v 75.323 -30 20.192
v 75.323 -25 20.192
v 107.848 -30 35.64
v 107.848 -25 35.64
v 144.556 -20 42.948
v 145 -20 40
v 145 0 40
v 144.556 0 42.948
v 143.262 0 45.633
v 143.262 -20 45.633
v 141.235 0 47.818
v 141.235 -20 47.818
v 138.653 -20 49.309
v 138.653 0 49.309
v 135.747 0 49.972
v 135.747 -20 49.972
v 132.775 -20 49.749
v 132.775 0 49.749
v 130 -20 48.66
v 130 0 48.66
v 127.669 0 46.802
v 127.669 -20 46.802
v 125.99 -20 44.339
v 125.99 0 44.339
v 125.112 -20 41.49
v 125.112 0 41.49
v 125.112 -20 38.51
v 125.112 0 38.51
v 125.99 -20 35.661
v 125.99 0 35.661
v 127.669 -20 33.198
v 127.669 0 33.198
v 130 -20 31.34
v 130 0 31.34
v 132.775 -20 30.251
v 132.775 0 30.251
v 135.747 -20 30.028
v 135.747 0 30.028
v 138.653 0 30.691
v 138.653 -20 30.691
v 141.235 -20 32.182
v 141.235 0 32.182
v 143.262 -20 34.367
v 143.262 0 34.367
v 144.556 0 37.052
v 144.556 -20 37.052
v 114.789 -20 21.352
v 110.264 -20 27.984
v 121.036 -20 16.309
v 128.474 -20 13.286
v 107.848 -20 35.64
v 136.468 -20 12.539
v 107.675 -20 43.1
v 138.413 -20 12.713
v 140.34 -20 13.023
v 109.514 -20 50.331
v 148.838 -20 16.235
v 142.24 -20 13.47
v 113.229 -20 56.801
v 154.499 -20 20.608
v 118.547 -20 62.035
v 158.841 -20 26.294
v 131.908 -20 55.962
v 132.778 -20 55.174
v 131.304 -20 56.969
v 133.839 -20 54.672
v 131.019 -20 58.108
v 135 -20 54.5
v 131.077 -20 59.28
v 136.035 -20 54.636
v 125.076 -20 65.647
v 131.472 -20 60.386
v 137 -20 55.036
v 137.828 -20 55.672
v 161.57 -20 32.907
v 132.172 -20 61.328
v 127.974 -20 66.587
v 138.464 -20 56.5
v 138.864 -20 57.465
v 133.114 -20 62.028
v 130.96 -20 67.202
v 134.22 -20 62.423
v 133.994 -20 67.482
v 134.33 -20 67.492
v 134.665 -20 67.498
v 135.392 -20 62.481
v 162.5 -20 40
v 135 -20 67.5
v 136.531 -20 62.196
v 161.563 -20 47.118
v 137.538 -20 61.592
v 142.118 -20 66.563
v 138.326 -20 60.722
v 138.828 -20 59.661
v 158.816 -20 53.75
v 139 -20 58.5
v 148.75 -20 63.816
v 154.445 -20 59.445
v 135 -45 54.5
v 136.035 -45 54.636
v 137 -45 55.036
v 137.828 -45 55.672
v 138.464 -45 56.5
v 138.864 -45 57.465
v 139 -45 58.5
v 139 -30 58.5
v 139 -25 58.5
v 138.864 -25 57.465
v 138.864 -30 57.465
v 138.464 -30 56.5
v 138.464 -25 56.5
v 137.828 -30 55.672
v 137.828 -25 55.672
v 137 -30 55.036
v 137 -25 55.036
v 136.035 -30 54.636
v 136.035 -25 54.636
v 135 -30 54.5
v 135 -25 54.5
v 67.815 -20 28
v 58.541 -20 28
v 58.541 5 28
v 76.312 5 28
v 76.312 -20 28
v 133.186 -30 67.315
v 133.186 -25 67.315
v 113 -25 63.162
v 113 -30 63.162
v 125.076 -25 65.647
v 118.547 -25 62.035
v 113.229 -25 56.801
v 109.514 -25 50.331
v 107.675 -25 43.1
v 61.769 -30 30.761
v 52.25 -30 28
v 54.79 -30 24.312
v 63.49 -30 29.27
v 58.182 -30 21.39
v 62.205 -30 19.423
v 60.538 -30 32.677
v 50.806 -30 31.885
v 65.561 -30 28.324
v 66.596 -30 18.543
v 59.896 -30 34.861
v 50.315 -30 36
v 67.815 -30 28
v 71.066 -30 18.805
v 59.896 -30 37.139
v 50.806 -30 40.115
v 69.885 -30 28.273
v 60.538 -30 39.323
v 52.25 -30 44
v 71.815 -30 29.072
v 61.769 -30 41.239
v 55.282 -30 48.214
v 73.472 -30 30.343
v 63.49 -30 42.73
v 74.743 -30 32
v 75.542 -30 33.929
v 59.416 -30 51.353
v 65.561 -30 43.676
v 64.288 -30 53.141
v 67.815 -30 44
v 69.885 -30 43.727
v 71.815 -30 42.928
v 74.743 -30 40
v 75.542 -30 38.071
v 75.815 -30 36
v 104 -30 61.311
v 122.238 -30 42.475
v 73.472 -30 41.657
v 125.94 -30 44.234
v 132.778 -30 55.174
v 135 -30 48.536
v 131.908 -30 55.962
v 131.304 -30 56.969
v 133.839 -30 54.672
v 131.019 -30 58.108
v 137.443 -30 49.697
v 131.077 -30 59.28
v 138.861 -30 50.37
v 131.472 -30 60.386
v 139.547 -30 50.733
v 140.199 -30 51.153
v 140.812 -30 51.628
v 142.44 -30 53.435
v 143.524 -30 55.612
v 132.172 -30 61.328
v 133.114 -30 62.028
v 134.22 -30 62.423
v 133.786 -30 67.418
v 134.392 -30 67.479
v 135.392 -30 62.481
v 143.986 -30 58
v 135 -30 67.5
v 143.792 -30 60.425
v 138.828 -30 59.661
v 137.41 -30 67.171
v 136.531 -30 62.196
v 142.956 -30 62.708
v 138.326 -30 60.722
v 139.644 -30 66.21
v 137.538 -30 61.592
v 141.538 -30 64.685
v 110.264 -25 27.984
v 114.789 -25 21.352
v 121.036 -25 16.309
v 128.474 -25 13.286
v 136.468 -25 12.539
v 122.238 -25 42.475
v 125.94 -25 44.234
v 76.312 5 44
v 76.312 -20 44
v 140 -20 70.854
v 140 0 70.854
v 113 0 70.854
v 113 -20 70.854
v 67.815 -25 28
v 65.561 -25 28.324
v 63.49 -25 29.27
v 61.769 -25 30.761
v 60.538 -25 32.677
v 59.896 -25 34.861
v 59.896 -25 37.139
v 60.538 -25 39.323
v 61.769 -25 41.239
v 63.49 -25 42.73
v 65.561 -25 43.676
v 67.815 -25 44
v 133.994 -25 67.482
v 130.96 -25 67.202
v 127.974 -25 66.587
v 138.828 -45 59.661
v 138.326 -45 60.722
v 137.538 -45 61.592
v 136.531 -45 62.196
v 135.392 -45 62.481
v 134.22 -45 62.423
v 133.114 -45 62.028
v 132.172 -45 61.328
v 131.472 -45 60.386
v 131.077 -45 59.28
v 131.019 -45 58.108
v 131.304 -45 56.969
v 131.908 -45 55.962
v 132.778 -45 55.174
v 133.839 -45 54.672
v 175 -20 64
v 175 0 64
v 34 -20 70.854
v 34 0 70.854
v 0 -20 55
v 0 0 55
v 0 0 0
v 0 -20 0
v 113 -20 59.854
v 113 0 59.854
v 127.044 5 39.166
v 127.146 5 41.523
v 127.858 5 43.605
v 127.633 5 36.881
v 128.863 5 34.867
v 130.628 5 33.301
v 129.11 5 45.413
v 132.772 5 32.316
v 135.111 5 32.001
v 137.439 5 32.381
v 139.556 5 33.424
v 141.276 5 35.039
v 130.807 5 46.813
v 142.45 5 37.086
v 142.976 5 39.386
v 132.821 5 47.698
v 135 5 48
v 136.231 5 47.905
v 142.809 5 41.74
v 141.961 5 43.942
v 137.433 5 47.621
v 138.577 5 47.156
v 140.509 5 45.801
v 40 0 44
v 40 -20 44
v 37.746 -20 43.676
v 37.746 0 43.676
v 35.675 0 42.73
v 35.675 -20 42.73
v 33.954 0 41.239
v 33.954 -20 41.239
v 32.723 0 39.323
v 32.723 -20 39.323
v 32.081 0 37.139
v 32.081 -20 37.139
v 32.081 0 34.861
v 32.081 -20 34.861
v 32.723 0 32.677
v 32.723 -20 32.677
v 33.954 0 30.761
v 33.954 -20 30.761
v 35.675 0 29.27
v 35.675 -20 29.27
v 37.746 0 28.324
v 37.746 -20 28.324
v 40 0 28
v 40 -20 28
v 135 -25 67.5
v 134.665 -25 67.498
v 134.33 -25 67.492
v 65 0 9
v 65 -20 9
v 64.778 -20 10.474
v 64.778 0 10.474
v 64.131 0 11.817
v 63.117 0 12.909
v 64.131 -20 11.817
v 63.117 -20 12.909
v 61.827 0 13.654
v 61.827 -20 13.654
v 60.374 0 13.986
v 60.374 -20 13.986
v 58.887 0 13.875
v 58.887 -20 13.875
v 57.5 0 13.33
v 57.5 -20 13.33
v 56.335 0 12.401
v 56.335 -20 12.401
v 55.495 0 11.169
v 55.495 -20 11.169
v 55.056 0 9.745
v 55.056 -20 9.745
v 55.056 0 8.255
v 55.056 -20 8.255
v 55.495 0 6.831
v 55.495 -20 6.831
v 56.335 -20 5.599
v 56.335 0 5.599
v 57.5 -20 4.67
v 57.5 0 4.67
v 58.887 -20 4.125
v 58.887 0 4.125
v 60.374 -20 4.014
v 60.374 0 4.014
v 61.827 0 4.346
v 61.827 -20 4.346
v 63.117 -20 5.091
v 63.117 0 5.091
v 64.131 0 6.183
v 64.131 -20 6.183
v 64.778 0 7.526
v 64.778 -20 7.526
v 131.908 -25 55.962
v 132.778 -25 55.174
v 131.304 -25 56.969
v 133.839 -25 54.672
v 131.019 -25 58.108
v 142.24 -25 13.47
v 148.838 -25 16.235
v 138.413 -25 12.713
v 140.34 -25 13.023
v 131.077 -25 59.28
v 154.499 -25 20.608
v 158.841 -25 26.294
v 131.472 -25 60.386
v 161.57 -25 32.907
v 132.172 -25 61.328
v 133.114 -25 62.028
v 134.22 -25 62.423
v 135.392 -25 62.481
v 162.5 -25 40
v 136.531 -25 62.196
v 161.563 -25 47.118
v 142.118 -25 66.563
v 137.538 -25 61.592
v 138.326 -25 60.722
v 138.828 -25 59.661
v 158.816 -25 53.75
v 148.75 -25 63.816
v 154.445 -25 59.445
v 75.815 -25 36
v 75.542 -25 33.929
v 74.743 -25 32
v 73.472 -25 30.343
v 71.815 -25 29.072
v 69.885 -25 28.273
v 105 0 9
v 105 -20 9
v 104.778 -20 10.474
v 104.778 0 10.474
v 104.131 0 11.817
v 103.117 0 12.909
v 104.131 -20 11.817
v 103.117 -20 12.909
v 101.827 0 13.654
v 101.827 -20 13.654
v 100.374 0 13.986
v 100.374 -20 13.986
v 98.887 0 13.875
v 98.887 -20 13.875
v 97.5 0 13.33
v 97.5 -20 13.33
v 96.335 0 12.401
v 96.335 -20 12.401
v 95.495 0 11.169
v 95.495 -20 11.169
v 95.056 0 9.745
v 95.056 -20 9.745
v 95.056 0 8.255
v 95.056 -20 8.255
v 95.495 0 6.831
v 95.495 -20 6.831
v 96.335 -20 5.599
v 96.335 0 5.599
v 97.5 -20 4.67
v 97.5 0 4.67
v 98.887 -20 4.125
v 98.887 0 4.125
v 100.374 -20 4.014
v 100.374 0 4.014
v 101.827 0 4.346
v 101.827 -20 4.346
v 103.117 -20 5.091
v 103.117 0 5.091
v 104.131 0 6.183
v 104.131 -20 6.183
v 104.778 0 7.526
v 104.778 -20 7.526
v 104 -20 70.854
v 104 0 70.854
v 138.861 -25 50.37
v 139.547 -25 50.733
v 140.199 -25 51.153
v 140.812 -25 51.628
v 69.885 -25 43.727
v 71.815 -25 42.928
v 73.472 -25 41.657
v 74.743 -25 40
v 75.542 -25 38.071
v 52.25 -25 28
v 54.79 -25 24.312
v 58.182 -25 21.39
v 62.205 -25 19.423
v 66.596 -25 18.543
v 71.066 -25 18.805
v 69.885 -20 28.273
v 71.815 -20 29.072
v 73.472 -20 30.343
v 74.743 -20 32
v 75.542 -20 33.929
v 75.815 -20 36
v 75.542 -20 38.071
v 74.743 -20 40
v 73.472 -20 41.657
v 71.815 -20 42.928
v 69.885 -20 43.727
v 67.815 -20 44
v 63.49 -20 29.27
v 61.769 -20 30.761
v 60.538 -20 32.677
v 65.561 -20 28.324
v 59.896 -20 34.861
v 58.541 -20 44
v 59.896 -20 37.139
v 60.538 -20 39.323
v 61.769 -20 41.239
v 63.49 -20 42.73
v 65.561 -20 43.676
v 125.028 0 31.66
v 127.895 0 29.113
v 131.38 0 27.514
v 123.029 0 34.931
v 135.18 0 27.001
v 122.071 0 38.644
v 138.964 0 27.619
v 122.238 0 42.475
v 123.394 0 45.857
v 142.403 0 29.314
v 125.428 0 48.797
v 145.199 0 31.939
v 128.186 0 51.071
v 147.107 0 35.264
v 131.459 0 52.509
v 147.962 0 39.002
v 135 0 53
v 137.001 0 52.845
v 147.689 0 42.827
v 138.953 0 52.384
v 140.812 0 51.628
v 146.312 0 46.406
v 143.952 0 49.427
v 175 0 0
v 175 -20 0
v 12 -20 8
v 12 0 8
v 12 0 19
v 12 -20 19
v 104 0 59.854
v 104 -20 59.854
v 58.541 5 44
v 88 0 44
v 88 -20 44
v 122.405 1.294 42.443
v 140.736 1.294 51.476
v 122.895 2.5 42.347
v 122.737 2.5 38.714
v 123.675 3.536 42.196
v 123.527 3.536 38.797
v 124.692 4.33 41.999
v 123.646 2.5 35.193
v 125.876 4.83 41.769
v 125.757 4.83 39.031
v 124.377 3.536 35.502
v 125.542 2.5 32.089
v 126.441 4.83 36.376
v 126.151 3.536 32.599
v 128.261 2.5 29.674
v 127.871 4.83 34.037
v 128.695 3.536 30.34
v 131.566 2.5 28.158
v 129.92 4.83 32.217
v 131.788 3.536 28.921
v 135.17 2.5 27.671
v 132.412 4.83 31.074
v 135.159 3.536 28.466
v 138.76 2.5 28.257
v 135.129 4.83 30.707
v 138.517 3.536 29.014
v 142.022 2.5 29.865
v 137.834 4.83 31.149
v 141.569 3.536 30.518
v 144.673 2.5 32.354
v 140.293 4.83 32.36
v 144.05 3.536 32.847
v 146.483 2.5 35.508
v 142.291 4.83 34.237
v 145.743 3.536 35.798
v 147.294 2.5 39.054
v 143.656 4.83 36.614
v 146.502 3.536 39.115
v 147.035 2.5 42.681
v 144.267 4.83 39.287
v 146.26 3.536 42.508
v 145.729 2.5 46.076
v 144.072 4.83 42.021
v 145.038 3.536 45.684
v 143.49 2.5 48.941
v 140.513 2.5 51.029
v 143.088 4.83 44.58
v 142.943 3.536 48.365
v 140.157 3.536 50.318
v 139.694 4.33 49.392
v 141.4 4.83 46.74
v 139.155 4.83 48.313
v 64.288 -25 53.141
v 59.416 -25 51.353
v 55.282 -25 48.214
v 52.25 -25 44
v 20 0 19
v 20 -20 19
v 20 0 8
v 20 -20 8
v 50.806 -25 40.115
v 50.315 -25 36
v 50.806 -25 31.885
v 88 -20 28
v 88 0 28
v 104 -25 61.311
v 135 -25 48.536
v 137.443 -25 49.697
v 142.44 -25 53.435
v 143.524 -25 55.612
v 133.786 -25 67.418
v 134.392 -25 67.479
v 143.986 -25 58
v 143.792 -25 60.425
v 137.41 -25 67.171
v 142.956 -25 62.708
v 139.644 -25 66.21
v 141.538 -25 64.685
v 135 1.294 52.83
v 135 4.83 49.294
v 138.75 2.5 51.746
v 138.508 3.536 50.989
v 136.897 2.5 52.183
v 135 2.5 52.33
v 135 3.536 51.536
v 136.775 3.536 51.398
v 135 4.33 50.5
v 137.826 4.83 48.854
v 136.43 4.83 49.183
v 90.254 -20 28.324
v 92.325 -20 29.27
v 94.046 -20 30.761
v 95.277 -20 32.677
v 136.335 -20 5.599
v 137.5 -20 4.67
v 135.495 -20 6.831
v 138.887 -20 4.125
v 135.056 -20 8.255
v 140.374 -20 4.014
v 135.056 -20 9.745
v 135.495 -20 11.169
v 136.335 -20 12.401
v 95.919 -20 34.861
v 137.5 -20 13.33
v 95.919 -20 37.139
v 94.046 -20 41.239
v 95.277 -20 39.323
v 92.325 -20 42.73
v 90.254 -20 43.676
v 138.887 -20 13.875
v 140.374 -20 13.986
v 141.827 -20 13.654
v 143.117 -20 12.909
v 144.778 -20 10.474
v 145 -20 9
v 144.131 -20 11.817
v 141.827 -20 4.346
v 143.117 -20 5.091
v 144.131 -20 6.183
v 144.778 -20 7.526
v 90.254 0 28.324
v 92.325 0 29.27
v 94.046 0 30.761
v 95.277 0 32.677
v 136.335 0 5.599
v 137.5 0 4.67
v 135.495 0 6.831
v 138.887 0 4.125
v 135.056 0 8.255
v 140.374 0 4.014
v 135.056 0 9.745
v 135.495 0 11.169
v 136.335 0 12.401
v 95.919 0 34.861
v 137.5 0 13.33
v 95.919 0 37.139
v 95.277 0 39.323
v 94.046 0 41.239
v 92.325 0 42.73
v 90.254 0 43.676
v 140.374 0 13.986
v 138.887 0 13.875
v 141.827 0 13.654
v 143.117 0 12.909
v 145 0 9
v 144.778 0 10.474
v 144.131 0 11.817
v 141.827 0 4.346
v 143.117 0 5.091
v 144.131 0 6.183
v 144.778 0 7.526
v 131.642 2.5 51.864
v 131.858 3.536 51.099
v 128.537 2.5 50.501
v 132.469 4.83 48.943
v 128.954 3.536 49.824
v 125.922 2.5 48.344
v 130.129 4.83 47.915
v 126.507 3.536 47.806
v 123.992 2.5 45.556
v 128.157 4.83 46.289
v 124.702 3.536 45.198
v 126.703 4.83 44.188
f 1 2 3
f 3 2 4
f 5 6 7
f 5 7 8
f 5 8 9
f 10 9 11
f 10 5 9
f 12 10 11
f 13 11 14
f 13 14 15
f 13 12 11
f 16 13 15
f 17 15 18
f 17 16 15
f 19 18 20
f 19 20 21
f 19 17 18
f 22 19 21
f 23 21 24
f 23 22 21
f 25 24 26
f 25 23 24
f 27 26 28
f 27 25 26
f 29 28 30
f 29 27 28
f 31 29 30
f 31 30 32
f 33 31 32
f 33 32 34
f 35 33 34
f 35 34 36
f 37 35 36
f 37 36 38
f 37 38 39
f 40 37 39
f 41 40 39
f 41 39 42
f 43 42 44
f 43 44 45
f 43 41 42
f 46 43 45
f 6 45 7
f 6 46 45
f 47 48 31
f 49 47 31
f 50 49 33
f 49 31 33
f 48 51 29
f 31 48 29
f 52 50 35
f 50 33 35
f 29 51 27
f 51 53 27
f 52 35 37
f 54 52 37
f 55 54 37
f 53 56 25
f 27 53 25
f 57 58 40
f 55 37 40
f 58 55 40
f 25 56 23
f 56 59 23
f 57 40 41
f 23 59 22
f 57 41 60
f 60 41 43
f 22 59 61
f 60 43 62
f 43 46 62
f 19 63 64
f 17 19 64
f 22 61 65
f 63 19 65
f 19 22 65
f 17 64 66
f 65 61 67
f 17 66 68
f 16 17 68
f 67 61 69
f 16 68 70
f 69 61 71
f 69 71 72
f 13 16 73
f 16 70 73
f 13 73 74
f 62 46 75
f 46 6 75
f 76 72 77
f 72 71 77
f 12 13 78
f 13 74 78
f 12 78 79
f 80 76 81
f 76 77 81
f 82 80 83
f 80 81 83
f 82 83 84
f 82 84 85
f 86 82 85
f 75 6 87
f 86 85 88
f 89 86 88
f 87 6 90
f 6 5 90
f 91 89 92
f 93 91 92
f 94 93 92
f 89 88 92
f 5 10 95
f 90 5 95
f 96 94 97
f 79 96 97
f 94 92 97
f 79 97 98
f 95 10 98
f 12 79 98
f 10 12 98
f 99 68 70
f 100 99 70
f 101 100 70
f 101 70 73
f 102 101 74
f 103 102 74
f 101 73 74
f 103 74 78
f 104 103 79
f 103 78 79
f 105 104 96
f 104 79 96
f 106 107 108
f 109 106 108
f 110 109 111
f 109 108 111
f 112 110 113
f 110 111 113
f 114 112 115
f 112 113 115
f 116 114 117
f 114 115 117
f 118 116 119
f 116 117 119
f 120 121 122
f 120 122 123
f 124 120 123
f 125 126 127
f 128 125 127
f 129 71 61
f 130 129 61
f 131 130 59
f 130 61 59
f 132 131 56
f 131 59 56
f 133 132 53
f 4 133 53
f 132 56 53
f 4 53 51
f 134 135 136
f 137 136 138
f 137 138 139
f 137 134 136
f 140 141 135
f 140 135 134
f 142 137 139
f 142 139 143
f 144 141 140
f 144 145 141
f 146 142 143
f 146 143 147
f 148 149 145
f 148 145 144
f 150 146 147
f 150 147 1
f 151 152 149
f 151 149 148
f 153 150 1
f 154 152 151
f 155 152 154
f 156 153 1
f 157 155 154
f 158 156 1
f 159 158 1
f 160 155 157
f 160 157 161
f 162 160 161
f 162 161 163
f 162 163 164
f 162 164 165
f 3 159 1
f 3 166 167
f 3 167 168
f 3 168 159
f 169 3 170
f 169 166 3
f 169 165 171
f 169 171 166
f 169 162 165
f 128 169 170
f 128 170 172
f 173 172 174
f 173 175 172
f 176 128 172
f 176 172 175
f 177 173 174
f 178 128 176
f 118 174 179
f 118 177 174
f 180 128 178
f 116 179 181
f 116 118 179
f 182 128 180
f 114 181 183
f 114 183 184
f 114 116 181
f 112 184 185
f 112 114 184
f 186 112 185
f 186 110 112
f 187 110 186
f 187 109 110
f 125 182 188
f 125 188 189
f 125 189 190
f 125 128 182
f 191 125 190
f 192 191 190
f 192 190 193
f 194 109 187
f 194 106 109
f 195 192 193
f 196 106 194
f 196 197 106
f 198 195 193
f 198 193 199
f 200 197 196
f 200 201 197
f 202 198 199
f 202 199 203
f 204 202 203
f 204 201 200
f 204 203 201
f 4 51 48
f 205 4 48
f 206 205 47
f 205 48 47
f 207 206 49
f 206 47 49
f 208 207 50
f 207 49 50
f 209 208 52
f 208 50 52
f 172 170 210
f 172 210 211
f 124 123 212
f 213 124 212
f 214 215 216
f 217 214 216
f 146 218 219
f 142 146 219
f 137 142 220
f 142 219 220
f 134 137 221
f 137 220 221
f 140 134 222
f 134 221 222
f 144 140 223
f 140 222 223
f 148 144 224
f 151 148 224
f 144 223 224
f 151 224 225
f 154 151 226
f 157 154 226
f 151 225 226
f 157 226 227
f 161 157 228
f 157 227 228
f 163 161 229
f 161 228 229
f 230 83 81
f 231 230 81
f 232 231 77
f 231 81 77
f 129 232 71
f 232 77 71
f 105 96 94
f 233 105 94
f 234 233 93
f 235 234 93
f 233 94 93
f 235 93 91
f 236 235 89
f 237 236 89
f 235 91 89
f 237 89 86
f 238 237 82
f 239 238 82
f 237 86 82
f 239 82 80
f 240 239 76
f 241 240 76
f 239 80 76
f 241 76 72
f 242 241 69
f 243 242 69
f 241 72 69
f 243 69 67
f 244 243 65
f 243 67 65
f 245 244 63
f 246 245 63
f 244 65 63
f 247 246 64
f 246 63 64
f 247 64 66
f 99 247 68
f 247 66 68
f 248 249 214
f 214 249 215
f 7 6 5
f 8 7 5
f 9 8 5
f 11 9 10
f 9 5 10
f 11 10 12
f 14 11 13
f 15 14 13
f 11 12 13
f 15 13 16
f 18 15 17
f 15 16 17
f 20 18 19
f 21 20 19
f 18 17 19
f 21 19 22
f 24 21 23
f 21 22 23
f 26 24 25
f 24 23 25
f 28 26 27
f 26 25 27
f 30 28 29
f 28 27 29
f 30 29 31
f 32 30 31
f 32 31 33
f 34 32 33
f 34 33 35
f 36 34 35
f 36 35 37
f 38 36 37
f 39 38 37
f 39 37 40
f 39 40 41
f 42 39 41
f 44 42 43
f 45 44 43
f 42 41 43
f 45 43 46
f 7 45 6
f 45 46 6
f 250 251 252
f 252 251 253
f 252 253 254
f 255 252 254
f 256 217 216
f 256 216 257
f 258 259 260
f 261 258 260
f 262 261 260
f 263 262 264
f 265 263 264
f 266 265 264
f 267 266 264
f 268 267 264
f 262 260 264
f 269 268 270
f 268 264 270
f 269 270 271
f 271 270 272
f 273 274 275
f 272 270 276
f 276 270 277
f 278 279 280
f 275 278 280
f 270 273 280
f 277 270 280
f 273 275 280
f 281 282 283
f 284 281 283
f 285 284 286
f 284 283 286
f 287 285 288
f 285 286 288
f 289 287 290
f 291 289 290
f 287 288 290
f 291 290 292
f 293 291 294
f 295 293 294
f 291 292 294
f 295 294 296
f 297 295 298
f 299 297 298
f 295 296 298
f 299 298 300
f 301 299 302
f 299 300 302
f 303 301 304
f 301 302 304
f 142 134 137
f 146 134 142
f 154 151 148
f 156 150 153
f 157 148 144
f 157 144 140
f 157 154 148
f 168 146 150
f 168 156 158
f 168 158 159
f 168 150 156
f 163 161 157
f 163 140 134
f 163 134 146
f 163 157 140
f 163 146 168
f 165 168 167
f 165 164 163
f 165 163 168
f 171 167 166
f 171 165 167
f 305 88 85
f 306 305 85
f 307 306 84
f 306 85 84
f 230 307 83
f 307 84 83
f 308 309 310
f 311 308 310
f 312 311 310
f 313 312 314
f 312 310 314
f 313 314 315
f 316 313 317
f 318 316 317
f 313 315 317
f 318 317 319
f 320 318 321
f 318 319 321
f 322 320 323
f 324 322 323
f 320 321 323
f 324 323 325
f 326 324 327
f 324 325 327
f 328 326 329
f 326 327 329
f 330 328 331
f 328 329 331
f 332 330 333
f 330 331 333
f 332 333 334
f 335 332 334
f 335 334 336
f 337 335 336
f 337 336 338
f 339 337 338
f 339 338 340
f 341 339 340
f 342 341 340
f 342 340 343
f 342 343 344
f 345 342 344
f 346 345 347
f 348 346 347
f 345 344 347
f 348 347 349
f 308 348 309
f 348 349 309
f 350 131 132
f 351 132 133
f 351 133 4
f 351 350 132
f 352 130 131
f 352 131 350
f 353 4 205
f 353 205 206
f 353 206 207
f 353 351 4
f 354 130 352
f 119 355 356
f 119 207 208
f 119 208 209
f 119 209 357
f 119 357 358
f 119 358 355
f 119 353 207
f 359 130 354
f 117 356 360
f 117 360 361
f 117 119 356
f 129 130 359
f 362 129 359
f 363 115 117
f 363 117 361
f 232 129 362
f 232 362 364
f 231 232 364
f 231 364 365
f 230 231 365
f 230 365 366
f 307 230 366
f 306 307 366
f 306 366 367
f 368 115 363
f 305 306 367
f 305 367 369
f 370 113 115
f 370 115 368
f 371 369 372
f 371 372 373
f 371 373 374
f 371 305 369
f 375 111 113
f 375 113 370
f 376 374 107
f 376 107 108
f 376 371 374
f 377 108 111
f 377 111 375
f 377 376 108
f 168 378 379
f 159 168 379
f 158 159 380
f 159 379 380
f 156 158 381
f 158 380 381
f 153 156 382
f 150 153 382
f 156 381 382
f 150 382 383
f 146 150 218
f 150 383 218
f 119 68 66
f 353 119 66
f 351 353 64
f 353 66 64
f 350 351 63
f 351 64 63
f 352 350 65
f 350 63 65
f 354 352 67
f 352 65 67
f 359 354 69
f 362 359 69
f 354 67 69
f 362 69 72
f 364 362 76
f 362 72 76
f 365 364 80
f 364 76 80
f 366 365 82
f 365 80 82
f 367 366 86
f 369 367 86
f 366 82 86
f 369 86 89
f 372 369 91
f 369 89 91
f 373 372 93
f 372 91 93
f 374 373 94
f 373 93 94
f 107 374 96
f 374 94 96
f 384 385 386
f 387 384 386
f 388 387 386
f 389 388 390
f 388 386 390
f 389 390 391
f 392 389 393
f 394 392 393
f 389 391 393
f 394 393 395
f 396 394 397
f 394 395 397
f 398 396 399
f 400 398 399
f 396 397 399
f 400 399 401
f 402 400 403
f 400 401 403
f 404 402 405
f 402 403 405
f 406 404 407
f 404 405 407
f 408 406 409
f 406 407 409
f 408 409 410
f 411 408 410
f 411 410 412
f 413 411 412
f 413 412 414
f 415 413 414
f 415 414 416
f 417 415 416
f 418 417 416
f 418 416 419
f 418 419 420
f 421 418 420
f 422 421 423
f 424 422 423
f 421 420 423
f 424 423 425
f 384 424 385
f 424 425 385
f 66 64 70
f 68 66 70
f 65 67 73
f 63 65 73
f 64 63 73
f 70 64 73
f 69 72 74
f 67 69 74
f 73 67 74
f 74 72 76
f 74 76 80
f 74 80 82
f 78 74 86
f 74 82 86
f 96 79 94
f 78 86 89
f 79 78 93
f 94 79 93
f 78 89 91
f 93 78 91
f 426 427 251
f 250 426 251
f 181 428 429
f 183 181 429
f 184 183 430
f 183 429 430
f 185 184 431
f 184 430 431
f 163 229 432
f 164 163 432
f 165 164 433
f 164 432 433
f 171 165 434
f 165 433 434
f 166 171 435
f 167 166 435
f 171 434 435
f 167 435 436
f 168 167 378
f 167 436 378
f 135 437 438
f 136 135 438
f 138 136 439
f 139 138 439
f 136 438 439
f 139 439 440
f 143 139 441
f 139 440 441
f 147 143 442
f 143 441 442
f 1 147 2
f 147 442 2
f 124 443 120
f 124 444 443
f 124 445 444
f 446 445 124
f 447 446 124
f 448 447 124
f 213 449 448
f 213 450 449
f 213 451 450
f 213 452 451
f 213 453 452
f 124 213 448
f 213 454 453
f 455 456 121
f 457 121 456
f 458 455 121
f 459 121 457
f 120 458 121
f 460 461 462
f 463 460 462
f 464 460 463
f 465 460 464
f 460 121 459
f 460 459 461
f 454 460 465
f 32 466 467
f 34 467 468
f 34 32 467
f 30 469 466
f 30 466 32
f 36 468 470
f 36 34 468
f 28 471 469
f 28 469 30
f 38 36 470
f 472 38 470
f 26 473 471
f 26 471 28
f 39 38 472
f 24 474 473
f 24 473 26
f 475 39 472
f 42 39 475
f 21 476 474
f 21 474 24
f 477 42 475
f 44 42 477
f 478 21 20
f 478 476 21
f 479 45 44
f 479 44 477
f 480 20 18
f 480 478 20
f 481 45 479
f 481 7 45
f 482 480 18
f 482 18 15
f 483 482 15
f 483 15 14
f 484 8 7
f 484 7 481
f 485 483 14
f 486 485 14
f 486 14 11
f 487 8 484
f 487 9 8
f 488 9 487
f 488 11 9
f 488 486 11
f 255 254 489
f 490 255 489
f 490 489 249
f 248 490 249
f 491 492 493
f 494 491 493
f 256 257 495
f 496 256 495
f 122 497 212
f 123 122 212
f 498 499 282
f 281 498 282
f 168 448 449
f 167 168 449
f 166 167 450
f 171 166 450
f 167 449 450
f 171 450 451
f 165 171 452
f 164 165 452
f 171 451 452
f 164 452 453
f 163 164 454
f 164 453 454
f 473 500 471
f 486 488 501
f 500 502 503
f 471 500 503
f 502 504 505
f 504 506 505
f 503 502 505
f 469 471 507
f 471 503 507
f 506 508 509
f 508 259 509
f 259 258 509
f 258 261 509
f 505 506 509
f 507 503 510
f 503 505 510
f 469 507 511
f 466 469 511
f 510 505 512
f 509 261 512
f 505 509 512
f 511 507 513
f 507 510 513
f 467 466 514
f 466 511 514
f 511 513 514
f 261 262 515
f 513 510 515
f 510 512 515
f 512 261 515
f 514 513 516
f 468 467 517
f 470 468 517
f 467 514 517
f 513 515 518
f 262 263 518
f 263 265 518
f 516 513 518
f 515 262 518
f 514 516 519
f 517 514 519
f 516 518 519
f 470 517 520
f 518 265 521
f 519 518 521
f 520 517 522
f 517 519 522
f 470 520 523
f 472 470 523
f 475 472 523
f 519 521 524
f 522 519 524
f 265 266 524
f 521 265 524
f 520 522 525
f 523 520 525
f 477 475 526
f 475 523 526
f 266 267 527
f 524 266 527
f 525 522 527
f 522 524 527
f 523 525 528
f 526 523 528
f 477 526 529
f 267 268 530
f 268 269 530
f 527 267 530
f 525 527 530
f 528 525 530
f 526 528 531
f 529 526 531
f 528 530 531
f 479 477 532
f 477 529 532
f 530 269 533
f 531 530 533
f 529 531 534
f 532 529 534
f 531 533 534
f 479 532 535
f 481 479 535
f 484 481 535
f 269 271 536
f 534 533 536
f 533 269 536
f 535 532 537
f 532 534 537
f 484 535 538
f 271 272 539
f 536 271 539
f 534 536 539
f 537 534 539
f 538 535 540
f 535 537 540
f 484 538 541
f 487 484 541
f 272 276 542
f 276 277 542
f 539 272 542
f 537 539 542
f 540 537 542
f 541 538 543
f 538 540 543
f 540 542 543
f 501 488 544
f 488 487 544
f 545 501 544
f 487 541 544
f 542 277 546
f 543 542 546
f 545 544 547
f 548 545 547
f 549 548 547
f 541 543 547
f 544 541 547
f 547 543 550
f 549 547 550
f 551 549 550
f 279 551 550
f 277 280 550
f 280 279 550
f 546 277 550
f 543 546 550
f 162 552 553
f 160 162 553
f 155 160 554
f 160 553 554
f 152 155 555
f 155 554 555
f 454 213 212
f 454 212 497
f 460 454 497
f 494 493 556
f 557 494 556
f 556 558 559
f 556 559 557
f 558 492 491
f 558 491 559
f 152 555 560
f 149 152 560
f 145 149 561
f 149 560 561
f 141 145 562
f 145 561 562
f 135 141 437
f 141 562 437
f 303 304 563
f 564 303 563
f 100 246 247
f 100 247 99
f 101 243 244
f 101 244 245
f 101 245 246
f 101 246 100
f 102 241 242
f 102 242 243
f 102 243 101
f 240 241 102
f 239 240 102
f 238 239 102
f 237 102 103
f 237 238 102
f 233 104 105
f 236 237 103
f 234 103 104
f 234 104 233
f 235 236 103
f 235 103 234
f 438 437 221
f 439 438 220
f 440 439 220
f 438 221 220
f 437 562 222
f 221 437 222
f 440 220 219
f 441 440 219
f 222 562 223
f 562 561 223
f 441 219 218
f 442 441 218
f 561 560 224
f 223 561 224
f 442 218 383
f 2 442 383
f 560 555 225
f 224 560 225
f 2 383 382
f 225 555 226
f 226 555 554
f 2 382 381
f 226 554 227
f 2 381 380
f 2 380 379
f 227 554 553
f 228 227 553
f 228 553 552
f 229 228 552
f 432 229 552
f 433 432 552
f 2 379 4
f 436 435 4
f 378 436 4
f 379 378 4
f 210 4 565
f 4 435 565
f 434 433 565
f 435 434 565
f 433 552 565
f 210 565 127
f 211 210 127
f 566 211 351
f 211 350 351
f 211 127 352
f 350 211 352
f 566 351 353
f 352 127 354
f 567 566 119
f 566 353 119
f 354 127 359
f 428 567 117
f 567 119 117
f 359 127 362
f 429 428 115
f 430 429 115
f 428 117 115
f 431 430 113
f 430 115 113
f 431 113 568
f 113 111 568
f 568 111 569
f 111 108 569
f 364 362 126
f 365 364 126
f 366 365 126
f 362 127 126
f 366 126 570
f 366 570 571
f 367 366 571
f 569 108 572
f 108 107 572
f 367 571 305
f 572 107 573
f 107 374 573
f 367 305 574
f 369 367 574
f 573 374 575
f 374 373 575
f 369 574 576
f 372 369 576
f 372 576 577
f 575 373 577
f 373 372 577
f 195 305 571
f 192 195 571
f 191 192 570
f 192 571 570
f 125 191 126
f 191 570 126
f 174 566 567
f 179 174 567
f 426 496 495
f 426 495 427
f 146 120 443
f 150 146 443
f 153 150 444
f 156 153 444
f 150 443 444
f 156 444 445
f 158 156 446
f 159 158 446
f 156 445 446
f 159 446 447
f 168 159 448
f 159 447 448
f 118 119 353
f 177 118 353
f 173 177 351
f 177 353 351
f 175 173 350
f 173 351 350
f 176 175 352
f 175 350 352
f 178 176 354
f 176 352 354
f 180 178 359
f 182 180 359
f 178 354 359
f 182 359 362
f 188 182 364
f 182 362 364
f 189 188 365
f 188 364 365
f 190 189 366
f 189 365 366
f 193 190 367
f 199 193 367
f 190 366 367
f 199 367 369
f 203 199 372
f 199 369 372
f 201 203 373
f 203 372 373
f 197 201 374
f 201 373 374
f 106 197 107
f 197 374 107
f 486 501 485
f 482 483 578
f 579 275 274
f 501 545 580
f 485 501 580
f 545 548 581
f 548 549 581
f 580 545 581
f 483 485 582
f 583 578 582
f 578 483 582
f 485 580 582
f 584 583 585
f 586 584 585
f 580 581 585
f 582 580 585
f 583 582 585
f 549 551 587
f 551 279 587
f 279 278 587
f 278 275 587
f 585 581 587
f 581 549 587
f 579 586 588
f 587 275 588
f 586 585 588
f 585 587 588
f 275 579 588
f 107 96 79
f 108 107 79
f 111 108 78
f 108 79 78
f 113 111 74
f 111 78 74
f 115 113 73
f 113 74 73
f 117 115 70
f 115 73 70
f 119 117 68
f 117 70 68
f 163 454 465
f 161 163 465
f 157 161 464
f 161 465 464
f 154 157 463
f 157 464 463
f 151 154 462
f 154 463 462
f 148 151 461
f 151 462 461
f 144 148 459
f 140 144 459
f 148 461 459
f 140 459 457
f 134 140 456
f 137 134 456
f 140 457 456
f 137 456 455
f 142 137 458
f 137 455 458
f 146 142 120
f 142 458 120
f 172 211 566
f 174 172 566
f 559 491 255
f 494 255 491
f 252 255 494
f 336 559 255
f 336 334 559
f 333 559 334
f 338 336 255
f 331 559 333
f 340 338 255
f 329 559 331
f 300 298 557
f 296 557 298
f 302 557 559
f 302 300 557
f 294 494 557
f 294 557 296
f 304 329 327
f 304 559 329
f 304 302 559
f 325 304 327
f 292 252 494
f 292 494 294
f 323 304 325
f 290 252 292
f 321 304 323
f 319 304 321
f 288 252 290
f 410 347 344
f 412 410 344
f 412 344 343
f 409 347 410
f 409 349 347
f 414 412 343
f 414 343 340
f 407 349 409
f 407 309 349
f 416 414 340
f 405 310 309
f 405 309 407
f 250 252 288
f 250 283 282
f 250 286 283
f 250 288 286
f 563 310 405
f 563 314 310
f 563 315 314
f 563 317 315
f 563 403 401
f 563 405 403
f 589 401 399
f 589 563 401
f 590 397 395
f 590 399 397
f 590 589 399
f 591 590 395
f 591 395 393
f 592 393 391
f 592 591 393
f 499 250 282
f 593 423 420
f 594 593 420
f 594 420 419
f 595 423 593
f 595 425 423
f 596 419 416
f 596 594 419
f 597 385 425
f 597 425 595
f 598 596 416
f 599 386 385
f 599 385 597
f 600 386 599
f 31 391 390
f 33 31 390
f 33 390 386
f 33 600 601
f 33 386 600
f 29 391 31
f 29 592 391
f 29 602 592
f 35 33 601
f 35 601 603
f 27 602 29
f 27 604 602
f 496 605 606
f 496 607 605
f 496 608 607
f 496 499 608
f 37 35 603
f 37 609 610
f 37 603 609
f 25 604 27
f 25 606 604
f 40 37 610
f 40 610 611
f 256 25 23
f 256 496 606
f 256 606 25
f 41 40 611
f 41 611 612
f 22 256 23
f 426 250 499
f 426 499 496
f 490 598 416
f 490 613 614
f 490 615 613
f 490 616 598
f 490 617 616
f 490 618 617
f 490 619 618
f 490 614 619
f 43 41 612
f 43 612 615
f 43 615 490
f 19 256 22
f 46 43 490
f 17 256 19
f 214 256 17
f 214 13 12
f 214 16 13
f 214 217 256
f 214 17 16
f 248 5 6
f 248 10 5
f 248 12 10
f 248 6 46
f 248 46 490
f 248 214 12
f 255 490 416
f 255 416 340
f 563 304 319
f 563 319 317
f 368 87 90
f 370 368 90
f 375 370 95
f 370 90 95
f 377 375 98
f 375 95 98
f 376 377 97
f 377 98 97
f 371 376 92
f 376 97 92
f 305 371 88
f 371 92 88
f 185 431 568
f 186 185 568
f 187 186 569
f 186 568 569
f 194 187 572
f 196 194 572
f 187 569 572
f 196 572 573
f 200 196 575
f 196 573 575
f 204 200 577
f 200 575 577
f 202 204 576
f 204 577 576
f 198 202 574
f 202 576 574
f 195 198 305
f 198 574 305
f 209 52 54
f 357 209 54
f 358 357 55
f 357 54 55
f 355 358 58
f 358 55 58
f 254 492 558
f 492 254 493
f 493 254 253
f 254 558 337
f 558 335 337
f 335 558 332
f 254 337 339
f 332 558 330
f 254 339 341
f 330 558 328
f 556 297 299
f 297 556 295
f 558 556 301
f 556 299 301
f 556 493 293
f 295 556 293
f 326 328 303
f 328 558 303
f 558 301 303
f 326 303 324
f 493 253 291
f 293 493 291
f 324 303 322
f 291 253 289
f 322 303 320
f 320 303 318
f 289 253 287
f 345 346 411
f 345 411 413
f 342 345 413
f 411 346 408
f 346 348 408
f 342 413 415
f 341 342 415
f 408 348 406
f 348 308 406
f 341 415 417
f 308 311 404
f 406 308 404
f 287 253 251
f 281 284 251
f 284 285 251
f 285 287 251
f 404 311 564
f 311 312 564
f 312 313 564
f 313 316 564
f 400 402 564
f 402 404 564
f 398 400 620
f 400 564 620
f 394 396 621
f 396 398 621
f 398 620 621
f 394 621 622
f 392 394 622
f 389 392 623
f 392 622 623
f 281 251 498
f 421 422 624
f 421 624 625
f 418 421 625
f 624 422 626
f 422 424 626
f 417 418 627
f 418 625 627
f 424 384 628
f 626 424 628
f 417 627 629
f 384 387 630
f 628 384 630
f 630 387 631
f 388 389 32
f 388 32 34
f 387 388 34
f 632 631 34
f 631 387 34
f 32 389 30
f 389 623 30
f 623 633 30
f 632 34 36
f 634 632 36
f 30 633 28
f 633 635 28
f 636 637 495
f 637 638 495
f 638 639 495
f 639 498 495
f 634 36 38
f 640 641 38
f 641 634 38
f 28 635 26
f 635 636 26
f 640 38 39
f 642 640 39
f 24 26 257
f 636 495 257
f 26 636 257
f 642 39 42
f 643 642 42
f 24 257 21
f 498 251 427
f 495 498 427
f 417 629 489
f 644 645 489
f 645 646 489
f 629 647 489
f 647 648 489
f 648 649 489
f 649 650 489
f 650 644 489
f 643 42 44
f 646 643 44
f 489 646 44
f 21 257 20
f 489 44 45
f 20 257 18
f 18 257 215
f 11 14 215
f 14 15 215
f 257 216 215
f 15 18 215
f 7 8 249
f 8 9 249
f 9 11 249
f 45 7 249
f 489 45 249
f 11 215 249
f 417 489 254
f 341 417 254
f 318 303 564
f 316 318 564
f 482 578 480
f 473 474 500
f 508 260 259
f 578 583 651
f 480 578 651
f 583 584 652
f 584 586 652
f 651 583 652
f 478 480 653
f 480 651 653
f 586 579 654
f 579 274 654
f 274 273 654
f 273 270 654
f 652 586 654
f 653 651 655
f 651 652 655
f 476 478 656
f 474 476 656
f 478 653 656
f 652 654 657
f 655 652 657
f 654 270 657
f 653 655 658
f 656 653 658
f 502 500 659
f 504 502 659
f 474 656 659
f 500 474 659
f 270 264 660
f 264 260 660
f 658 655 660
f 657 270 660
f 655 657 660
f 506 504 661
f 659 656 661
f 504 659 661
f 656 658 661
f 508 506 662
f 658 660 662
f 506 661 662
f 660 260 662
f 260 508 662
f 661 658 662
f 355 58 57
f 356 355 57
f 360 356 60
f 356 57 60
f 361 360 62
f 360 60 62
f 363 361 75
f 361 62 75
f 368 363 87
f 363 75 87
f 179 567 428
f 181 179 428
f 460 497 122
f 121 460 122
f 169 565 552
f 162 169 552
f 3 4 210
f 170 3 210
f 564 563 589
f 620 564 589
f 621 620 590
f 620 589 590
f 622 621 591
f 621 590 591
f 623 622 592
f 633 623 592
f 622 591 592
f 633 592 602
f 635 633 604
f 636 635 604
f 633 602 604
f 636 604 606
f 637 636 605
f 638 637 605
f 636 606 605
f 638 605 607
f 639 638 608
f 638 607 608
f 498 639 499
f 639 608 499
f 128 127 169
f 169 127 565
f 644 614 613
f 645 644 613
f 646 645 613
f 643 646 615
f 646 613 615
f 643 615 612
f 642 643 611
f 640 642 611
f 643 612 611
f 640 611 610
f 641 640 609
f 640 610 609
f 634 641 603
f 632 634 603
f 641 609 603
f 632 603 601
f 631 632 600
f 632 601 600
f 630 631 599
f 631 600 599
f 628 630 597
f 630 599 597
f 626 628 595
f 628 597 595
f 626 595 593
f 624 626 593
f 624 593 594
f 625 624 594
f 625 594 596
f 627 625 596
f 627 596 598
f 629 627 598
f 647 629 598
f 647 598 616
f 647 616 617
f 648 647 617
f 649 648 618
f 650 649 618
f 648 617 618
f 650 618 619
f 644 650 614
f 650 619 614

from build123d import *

# Parameters (mm, degrees)
F1_DEPTH       = 20
F2_W           = 8
F2_H           = 11
F2_R           = 5
F2_R_2         = 10
F3_DEPTH       = 20
F5_DEPTH       = 5
F5_DEPTH_BACK  = 25
F7_R           = 4.99999
F8_DEPTH       = 5
F9_DEPTH       = 25
F10_START      = 5
F10_DEPTH      = 5
F11_DEPTH      = 25
F11_DEPTH_BACK = 10
F12_DEPTH      = 25


# Not quite as in the source:
# - a fillet or chamfer is up to 0.001 mm smaller than in the source, because OpenCascade refuses the exact size


with BuildPart() as f1:
    # F0 (on Front) → F1 (new body)
    with BuildSketch(Plane.XZ):
        Polygon((0, 55), (0, 0), (175, 0), (175, 64), (140, 70.8544603773), (113, 70.8544603773), (113, 59.8544603773), (104, 59.8544603773), (104, 70.8544603773), (34, 70.8544603773), align=None)
    extrude(amount=F1_DEPTH)

    # F2 (on face) → F3 (cut, through all)
    with BuildSketch(Plane.XZ.offset(20)):
        with Locations((16, 13.5)):
            Rectangle(F2_W, F2_H)
        with Locations((60, 9)):
            Circle(F2_R)
        with BuildLine():
            Line((88, 44), (40, 44))
            ThreePointArc((40, 44), (32, 36), (40, 28))
            Line((40, 28), (88, 28))
            ThreePointArc((88, 28), (96, 36), (88, 44))
        make_face()
        with Locations((135, 40)):
            Circle(F2_R_2)
        with Locations((100, 9)):
            Circle(F2_R)
        with Locations((140, 9)):
            Circle(F2_R)
    extrude(amount=-F3_DEPTH, mode=Mode.SUBTRACT)


with BuildPart() as f5:
    # F4 (on face) → F5 (new body, two sides)
    with BuildSketch(Plane.XZ.offset(20)) as f5_sk:
        with BuildLine():
            ThreePointArc((148, 40), (146.0579755506, 46.8352890738), (140.8121266581, 51.6283783784))
            ThreePointArc((140.8121266581, 51.6283783784), (139.8774040705, 50.9362093146), (138.8612225529, 50.3703652975))
            Line((138.8612225529, 50.3703652975), (137.4433104674, 49.6969187869))
            ThreePointArc((137.4433104674, 49.6969187869), (142.8877469747, 46.1468241933), (145, 40))
            ThreePointArc((145, 40), (132.8316568043, 30.2379158073), (125.9403424429, 44.2335097671))
            Line((125.9403424429, 44.2335097671), (122.2377651401, 42.4749467432))
            ThreePointArc((122.2377651401, 42.4749467432), (133.7568292913, 27.0595778048), (148, 40))
        make_face()
        with BuildLine():
            ThreePointArc((138.8612225529, 50.3703652975), (139.8774040705, 50.9362093146), (140.8121266581, 51.6283783784))
            ThreePointArc((140.8121266581, 51.6283783784), (137.9858902425, 52.6524487535), (135, 53))
            Line((135, 53), (135, 50))
            ThreePointArc((135, 50), (136.2310183043, 49.9239404439), (137.4433104674, 49.6969187869))
            Line((137.4433104674, 49.6969187869), (138.8612225529, 50.3703652975))
        make_face()
        with BuildLine():
            Line((135, 50), (135, 53))
            ThreePointArc((135, 53), (126.7287941527, 50.0293147239), (122.2377651401, 42.4749467432))
            Line((122.2377651401, 42.4749467432), (125.9403424429, 44.2335097671))
            ThreePointArc((125.9403424429, 44.2335097671), (129.6304142465, 48.4360861088), (135, 50))
        make_face()
        with BuildLine():
            Line((135, 48.5364526865), (135, 50))
            ThreePointArc((135, 50), (129.6304142465, 48.4360861088), (125.9403424429, 44.2335097671))
            Line((125.9403424429, 44.2335097671), (135, 48.5364526865))
        make_face()
        with BuildLine():
            ThreePointArc((145, 40), (142.8877469747, 46.1468241933), (137.4433104674, 49.6969187869))
            Line((137.4433104674, 49.6969187869), (135, 48.5364526865))
            Line((135, 48.5364526865), (125.9403424429, 44.2335097671))
            ThreePointArc((125.9403424429, 44.2335097671), (132.8316568043, 30.2379158073), (145, 40))
        make_face()
        with BuildLine():
            Line((135, 48.5364526865), (137.4433104674, 49.6969187869))
            ThreePointArc((137.4433104674, 49.6969187869), (136.2310183043, 49.9239404439), (135, 50))
            Line((135, 50), (135, 48.5364526865))
        make_face()
    extrude(amount=F5_DEPTH)
    extrude(f5_sk.sketch, amount=-F5_DEPTH_BACK)

    # F6: cut F1
    add(f1.part, mode=Mode.SUBTRACT)

    # F7 (radius 5 in the source; OpenCascade refuses exactly that, so slightly less here)
    f7_edges = [f5.edges().sort_by_distance(p)[0] for p in [
        (135, 5, 27),
    ]]
    fillet(f7_edges, radius=F7_R)

    # F4 (on face) → F8 (join)
    with BuildSketch(Plane.XZ.offset(20)):
        with BuildLine():
            ThreePointArc((142.2400098005, 13.470162871), (156.8557803511, 23.3094378392), (162.5, 40))
            ThreePointArc((162.5, 40), (154.4454364826, 59.4454364826), (135, 67.5))
            ThreePointArc((135, 67.5), (143.4511713565, 61.5947863743), (140.8121266581, 51.6283783784))
            ThreePointArc((140.8121266581, 51.6283783784), (146.0579755506, 46.8352890738), (148, 40))
            ThreePointArc((148, 40), (133.7568292913, 27.0595778048), (122.2377651401, 42.4749467432))
            Line((122.2377651401, 42.4749467432), (107.8477760814, 35.6403284212))
            ThreePointArc((107.8477760814, 35.6403284212), (117.7276760177, 18.601008803), (136.4681544997, 12.5392184677))
            ThreePointArc((136.4681544997, 12.5392184677), (139.2038378059, 13.9362056036), (142.2400098005, 13.470162871))
        make_face()
        with BuildLine():
            ThreePointArc((140.8121266581, 51.6283783784), (143.4511713565, 61.5947863743), (135, 67.5))
            ThreePointArc((135, 67.5), (134.0885205875, 67.4537257765), (133.1864140644, 67.3153789513))
            Line((133.1864140644, 67.3153789513), (125.0755076463, 65.646723992))
            ThreePointArc((125.0755076463, 65.646723992), (111.1511705492, 53.6924553615), (107.8477760814, 35.6403284212))
            Line((107.8477760814, 35.6403284212), (122.2377651401, 42.4749467432))
            ThreePointArc((122.2377651401, 42.4749467432), (126.7287941527, 50.0293147239), (135, 53))
            ThreePointArc((135, 53), (137.9858902425, 52.6524487535), (140.8121266581, 51.6283783784))
        make_face()
        with BuildLine():
            ThreePointArc((139, 58.5), (137.8284271247, 55.6715728753), (135, 54.5))
            ThreePointArc((135, 54.5), (132.1715728753, 61.3284271247), (139, 58.5))
        make_face(mode=Mode.SUBTRACT)
        with BuildLine():
            Line((133.1864140644, 67.3153789513), (133.9944124644, 67.481608281))
            ThreePointArc((133.9944124644, 67.481608281), (129.458487419, 66.9358801288), (125.0755076463, 65.646723992))
            Line((125.0755076463, 65.646723992), (133.1864140644, 67.3153789513))
        make_face()
        with BuildLine():
            ThreePointArc((133.1864140644, 67.3153789513), (134.0885205875, 67.4537257765), (135, 67.5))
            ThreePointArc((135, 67.5), (134.4971221453, 67.4954016858), (133.9944124644, 67.481608281))
            Line((133.9944124644, 67.481608281), (133.1864140644, 67.3153789513))
        make_face()
        with BuildLine():
            ThreePointArc((136.4681544997, 12.5392184677), (139.3788920677, 12.8508691804), (142.2400098005, 13.470162871))
            ThreePointArc((142.2400098005, 13.470162871), (139.2038378059, 13.9362056036), (136.4681544997, 12.5392184677))
        make_face()
    extrude(amount=F8_DEPTH)


with BuildPart() as f9:
    # F4 (on face) → F9 (new body)
    with BuildSketch(Plane.XZ.offset(20)):
        with BuildLine():
            ThreePointArc((139, 58.5), (132.1715728753, 61.3284271247), (135, 54.5))
            ThreePointArc((135, 54.5), (137.8284271247, 55.6715728753), (139, 58.5))
        make_face()
    extrude(amount=F9_DEPTH)


with BuildPart() as f10:
    # F4 (on face) → F10 (new body)
    with BuildSketch(Plane.XZ.offset(20).offset(F10_START)):
        with BuildLine():
            ThreePointArc((140.8121266581, 51.6283783784), (143.4511713565, 61.5947863743), (135, 67.5))
            ThreePointArc((135, 67.5), (134.0885205875, 67.4537257765), (133.1864140644, 67.3153789513))
            Line((133.1864140644, 67.3153789513), (125.0755076463, 65.646723992))
            ThreePointArc((125.0755076463, 65.646723992), (111.1511705492, 53.6924553615), (107.8477760814, 35.6403284212))
            Line((107.8477760814, 35.6403284212), (122.2377651401, 42.4749467432))
            ThreePointArc((122.2377651401, 42.4749467432), (126.7287941527, 50.0293147239), (135, 53))
            ThreePointArc((135, 53), (137.9858902425, 52.6524487535), (140.8121266581, 51.6283783784))
        make_face()
        with BuildLine():
            ThreePointArc((139, 58.5), (137.8284271247, 55.6715728753), (135, 54.5))
            ThreePointArc((135, 54.5), (132.1715728753, 61.3284271247), (139, 58.5))
        make_face(mode=Mode.SUBTRACT)
        with BuildLine():
            ThreePointArc((138.8612225529, 50.3703652975), (139.8774040705, 50.9362093146), (140.8121266581, 51.6283783784))
            ThreePointArc((140.8121266581, 51.6283783784), (137.9858902425, 52.6524487535), (135, 53))
            Line((135, 53), (135, 50))
            ThreePointArc((135, 50), (136.2310183043, 49.9239404439), (137.4433104674, 49.6969187869))
            Line((137.4433104674, 49.6969187869), (138.8612225529, 50.3703652975))
        make_face()
        with BuildLine():
            ThreePointArc((107.8477760814, 35.6403284212), (111.1511705492, 53.6924553615), (125.0755076463, 65.646723992))
            Line((125.0755076463, 65.646723992), (113, 63.1624325107))
            Line((113, 63.1624325107), (113, 59.8544603773))
            Line((113, 59.8544603773), (104, 59.8544603773))
            Line((104, 59.8544603773), (104, 61.3108645282))
            Line((104, 61.3108645282), (64.2884421212, 53.1410146274))
            ThreePointArc((64.2884421212, 53.1410146274), (57.231655846, 49.9372094187), (52.2504768019, 44))
            Line((52.2504768019, 44), (58.5414022207, 44))
            Line((58.5414022207, 44), (67.8148592182, 44))
            Line((67.8148592182, 44), (76.3124004006, 44))
            Line((76.3124004006, 44), (88, 44))
            ThreePointArc((88, 44), (96, 36), (88, 28))
            Line((88, 28), (76.3124004006, 28))
            Line((76.3124004006, 28), (67.8148592182, 28))
            Line((67.8148592182, 28), (58.5414022207, 28))
            Line((58.5414022207, 28), (52.2504768019, 28))
            ThreePointArc((52.2504768019, 28), (62.2053726379, 19.4234002188), (75.32279196, 20.1923769673))
            Line((75.32279196, 20.1923769673), (107.8477760814, 35.6403284212))
        make_face()
        with BuildLine():
            Line((135, 50), (135, 53))
            ThreePointArc((135, 53), (126.7287941527, 50.0293147239), (122.2377651401, 42.4749467432))
            Line((122.2377651401, 42.4749467432), (125.9403424429, 44.2335097671))
            ThreePointArc((125.9403424429, 44.2335097671), (129.6304142465, 48.4360861088), (135, 50))
        make_face()
        Polygon((113, 59.8544603773), (113, 63.1624325107), (104, 61.3108645282), (104, 59.8544603773), align=None)
        with BuildLine():
            Line((135, 48.5364526865), (137.4433104674, 49.6969187869))
            ThreePointArc((137.4433104674, 49.6969187869), (136.2310183043, 49.9239404439), (135, 50))
            Line((135, 50), (135, 48.5364526865))
        make_face()
        with BuildLine():
            Line((135, 48.5364526865), (135, 50))
            ThreePointArc((135, 50), (129.6304142465, 48.4360861088), (125.9403424429, 44.2335097671))
            Line((125.9403424429, 44.2335097671), (135, 48.5364526865))
        make_face()
        with BuildLine():
            ThreePointArc((52.2504768019, 44), (50.3148592182, 36), (52.2504768019, 28))
            Line((52.2504768019, 28), (58.5414022207, 28))
            Line((58.5414022207, 28), (58.5414022207, 44))
            Line((58.5414022207, 44), (52.2504768019, 44))
        make_face()
        with BuildLine():
            Line((58.5414022207, 44), (58.5414022207, 28))
            Line((58.5414022207, 28), (67.8148592182, 28))
            ThreePointArc((67.8148592182, 28), (59.8148592182, 36), (67.8148592182, 44))
            Line((67.8148592182, 44), (58.5414022207, 44))
        make_face()
        with BuildLine():
            ThreePointArc((75.8148592182, 36), (73.4717134677, 30.3431457505), (67.8148592182, 28))
            Line((67.8148592182, 28), (76.3124004006, 28))
            Line((76.3124004006, 28), (76.3124004006, 44))
            Line((76.3124004006, 44), (67.8148592182, 44))
            ThreePointArc((67.8148592182, 44), (73.4717134677, 41.6568542495), (75.8148592182, 36))
        make_face()
        with BuildLine():
            Line((76.3124004006, 44), (76.3124004006, 28))
            Line((76.3124004006, 28), (88, 28))
            ThreePointArc((88, 28), (96, 36), (88, 44))
            Line((88, 44), (76.3124004006, 44))
        make_face()
    extrude(amount=F10_DEPTH)


with BuildPart() as f11:
    # F4 (on face) → F11 (new body, two sides)
    with BuildSketch(Plane.XZ.offset(20)) as f11_sk:
        with BuildLine():
            ThreePointArc((67.8148592182, 44), (59.8148592182, 36), (67.8148592182, 28))
            ThreePointArc((67.8148592182, 28), (73.4717134677, 30.3431457505), (75.8148592182, 36))
            ThreePointArc((75.8148592182, 36), (73.4717134677, 41.6568542495), (67.8148592182, 44))
        make_face()
    extrude(amount=-F11_DEPTH)
    extrude(f11_sk.sketch, amount=F11_DEPTH_BACK)

    # F4 (on face) → F12 (join)
    with BuildSketch(Plane.XZ.offset(20)):
        with BuildLine():
            Line((58.5414022207, 44), (58.5414022207, 28))
            Line((58.5414022207, 28), (67.8148592182, 28))
            ThreePointArc((67.8148592182, 28), (59.8148592182, 36), (67.8148592182, 44))
            Line((67.8148592182, 44), (58.5414022207, 44))
        make_face()
        with BuildLine():
            ThreePointArc((75.8148592182, 36), (73.4717134677, 30.3431457505), (67.8148592182, 28))
            Line((67.8148592182, 28), (76.3124004006, 28))
            Line((76.3124004006, 28), (76.3124004006, 44))
            Line((76.3124004006, 44), (67.8148592182, 44))
            ThreePointArc((67.8148592182, 44), (73.4717134677, 41.6568542495), (75.8148592182, 36))
        make_face()
    extrude(amount=-F12_DEPTH)


solid = Compound([f1.part, f5.part, f9.part, f10.part, f11.part])
